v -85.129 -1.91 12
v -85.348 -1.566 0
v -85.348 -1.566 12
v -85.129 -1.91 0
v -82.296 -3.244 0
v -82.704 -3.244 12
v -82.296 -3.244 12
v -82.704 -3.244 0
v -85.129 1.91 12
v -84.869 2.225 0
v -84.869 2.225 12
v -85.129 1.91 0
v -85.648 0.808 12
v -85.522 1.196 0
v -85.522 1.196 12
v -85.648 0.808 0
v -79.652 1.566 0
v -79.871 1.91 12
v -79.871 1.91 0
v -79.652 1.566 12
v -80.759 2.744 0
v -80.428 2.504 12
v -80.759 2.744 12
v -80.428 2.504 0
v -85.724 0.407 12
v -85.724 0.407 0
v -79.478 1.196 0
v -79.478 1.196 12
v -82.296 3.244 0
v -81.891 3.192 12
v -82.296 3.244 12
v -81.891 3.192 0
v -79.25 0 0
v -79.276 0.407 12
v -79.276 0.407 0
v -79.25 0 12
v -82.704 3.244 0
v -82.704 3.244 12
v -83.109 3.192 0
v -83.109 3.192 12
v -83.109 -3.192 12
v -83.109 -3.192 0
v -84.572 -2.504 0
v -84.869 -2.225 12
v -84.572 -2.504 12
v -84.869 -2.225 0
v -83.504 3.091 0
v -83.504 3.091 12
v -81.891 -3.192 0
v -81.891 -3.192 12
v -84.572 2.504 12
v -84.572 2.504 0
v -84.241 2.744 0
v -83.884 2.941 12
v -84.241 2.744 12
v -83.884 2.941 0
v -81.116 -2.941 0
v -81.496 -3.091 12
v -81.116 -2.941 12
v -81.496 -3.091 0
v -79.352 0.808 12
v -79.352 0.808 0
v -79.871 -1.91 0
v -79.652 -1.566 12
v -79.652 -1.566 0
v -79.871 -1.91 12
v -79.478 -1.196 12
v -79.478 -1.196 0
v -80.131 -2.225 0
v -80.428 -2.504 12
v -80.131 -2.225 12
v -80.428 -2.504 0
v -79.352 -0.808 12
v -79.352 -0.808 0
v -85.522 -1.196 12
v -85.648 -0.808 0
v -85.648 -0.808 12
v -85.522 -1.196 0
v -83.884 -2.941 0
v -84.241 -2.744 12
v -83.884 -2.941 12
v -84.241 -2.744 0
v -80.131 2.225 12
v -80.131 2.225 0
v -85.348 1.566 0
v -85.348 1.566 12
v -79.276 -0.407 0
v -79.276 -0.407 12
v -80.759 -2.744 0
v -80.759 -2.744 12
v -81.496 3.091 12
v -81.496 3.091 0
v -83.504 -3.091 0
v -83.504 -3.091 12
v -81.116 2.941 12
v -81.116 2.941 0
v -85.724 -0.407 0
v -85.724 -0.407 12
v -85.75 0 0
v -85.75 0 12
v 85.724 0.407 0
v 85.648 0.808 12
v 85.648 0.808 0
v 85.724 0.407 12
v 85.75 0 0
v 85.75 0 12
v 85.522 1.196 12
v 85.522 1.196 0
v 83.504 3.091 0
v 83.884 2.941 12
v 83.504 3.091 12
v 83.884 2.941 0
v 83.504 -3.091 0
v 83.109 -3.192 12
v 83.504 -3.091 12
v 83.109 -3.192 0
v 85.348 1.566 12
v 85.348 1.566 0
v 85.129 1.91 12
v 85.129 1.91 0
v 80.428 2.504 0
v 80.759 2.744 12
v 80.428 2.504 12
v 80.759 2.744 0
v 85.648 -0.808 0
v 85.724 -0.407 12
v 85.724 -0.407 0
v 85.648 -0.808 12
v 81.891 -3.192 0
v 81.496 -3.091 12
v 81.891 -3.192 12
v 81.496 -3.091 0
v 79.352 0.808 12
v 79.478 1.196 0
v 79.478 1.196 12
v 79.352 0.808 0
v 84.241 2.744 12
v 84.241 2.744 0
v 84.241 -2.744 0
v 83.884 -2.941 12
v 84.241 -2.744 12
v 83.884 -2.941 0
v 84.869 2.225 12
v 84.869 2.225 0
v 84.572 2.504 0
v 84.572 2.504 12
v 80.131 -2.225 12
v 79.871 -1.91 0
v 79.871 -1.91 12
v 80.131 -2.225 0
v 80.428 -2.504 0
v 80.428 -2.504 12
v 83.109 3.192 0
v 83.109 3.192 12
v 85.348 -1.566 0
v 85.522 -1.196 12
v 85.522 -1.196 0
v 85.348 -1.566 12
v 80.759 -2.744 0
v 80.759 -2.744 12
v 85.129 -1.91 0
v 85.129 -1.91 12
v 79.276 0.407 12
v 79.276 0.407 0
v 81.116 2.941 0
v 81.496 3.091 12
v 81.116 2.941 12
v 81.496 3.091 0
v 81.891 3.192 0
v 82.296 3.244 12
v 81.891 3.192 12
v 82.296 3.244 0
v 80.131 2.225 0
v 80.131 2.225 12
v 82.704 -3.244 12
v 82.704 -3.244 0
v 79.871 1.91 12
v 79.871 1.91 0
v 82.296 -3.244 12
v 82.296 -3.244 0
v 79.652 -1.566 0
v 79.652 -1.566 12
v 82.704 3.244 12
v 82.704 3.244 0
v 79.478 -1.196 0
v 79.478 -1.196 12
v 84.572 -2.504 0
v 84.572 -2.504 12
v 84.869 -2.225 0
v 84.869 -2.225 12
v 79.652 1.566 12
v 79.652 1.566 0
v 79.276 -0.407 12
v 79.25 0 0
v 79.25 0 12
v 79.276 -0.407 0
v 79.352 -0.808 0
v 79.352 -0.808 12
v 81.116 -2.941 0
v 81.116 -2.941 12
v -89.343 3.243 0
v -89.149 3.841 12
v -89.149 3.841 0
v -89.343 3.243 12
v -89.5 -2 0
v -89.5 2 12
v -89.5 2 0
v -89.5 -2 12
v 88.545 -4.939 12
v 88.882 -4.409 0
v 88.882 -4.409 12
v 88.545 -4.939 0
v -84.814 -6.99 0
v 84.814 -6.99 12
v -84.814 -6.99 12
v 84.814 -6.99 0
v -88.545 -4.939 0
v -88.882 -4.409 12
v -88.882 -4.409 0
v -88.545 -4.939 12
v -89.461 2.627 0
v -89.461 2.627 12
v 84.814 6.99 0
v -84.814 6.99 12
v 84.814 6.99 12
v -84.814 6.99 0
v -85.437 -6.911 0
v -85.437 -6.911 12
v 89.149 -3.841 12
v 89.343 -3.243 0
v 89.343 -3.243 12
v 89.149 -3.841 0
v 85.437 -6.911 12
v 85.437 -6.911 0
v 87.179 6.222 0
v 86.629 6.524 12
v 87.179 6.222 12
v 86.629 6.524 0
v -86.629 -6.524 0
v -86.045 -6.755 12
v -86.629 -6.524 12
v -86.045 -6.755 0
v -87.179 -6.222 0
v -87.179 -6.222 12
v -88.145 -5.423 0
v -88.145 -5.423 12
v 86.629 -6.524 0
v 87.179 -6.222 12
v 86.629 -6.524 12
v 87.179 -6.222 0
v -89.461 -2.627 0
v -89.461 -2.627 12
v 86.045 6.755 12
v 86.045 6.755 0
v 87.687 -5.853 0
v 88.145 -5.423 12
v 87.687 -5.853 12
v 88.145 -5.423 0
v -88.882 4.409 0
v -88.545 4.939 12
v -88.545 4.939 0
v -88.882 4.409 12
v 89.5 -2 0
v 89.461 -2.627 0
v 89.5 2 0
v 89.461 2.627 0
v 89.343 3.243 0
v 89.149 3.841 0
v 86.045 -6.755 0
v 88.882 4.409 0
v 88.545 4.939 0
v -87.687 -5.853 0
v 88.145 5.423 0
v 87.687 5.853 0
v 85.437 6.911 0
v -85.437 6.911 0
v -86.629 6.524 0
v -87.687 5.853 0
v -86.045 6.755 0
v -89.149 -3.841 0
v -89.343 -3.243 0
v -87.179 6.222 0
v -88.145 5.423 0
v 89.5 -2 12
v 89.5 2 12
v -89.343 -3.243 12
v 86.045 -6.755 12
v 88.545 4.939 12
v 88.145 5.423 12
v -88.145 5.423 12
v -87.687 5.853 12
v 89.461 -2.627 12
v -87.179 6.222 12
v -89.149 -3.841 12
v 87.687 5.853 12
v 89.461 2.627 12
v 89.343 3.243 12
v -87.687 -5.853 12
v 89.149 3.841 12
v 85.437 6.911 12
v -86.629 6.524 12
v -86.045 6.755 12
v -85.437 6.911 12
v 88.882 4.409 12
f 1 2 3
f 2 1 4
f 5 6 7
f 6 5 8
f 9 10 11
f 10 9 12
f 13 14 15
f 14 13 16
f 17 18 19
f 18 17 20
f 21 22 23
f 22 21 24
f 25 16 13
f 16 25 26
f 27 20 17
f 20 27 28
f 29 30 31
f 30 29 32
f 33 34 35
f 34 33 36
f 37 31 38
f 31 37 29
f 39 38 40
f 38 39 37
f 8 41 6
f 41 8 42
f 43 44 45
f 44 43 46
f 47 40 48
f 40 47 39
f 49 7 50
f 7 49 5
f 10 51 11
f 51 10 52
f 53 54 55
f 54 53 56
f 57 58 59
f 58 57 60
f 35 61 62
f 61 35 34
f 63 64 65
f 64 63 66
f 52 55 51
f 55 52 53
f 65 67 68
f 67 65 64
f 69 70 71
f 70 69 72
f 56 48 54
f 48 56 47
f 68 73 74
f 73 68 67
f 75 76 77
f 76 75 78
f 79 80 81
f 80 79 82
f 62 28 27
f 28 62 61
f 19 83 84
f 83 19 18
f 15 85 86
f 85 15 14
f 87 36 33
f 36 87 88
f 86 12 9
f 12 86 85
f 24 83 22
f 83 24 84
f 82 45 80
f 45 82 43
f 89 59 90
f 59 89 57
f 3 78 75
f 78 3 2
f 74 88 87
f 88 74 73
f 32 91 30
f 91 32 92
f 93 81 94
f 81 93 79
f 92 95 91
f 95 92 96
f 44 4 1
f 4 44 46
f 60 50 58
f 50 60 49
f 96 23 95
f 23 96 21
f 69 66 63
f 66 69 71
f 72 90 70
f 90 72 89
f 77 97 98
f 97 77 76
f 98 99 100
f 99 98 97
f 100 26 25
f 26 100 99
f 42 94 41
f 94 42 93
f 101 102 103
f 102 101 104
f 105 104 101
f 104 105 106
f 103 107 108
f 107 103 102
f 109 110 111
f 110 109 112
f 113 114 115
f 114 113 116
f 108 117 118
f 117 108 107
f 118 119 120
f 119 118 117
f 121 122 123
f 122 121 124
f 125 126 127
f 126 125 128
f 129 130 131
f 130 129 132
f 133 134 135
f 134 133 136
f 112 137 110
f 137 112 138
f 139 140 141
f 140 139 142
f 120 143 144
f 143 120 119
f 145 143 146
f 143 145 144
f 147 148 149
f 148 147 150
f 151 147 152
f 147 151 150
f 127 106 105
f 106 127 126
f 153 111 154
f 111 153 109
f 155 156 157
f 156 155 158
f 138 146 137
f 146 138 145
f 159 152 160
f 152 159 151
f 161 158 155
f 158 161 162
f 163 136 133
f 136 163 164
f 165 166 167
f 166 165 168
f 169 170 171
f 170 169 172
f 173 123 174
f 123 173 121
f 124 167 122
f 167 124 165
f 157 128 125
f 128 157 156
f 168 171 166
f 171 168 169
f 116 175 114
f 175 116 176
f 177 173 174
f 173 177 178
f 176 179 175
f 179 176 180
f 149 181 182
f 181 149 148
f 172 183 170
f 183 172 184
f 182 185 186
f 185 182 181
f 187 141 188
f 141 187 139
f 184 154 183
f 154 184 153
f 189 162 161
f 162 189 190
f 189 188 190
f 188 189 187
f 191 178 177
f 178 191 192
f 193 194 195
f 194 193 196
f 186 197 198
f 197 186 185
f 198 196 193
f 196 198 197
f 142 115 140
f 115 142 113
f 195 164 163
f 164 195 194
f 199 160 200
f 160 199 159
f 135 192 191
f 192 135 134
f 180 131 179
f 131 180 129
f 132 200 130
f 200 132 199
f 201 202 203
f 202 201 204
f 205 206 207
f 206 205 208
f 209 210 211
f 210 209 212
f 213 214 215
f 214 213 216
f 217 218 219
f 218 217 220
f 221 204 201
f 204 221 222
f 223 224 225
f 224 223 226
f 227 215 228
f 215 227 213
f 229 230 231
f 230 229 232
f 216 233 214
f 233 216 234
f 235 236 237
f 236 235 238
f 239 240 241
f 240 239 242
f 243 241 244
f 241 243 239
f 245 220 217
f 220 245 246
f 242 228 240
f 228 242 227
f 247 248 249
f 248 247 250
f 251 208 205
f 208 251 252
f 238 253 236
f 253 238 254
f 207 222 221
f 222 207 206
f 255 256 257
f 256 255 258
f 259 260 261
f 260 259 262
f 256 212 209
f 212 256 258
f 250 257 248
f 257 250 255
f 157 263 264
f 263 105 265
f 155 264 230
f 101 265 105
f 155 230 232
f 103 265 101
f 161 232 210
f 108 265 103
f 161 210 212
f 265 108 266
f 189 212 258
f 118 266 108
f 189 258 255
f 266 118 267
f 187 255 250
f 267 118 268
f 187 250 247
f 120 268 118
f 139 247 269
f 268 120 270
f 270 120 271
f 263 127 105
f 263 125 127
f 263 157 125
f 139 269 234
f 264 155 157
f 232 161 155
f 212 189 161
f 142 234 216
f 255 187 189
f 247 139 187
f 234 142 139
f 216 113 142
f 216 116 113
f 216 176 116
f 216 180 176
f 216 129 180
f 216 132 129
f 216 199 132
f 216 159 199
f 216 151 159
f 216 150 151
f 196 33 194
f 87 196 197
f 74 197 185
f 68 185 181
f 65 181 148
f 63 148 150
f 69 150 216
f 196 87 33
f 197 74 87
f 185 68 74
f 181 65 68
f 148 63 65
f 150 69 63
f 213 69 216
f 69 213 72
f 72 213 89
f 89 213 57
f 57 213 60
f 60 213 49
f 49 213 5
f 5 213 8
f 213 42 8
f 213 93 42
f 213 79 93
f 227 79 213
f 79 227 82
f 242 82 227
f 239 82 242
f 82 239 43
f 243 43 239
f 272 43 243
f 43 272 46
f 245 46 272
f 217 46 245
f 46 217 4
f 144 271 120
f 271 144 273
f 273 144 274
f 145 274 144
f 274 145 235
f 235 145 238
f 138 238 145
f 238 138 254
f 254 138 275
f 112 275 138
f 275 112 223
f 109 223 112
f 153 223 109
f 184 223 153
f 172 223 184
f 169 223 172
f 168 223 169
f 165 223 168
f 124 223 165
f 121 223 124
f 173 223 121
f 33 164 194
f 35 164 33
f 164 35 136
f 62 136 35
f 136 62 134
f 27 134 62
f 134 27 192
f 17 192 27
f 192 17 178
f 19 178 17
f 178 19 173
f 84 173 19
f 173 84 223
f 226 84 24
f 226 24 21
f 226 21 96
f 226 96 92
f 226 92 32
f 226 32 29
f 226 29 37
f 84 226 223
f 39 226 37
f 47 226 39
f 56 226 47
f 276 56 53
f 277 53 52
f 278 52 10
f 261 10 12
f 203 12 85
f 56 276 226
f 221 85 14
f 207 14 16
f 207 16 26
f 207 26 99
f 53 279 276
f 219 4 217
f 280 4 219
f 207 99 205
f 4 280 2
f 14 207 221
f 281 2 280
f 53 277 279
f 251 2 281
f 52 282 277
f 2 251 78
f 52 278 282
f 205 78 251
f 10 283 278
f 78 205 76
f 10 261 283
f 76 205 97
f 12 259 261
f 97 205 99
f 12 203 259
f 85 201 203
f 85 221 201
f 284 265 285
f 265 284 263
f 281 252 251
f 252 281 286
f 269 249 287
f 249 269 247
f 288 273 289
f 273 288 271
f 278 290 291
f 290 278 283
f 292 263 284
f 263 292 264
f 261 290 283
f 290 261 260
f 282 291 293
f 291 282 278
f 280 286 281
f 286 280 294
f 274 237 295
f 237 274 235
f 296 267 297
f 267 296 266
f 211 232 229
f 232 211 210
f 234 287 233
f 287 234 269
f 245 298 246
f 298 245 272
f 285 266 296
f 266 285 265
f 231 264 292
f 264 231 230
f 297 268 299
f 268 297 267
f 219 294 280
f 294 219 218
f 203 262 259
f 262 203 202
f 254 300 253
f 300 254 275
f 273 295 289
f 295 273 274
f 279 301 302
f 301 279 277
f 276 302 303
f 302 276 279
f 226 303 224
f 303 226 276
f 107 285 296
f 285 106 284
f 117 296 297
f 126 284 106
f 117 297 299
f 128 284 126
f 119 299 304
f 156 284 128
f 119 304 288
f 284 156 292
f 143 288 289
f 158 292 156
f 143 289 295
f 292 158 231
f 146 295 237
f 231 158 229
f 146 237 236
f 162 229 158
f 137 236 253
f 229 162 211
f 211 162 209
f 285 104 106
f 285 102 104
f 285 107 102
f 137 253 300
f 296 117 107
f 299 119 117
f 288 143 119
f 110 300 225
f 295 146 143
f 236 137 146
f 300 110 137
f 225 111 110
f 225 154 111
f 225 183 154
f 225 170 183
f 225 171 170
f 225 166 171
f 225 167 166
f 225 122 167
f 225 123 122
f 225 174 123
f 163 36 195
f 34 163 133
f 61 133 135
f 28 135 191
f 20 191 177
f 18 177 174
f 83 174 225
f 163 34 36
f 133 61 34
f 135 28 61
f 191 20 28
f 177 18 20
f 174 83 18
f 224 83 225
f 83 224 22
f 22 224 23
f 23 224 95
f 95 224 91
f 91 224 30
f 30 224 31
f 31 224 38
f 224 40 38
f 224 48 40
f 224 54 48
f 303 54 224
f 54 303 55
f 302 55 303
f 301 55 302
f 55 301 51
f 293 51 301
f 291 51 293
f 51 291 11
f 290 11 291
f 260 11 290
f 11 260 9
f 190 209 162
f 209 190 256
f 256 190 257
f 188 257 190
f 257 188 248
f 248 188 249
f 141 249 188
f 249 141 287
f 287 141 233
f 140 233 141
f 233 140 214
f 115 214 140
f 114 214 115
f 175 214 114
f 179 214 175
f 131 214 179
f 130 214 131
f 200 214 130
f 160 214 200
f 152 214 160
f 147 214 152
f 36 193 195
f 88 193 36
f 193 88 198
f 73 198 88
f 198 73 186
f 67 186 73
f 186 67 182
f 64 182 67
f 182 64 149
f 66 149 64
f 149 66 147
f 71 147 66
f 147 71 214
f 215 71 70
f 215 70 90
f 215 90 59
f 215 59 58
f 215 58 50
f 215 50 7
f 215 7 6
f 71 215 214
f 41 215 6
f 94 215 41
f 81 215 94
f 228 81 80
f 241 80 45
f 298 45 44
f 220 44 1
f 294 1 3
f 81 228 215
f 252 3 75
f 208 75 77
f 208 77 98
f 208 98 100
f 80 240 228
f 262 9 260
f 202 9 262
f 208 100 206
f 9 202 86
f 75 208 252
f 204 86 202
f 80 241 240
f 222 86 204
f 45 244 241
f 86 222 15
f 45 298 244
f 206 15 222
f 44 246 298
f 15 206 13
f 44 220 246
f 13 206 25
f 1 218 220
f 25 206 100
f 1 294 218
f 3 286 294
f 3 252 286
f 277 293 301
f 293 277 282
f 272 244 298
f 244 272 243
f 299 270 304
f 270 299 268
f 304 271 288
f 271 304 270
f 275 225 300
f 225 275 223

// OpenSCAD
$fn = 50;


difference() {
	union() {
		hull() {
			translate(v = [-84.5000000000, 2.0000000000, 0]) {
				cylinder(h = 12, r = 5);
			}
			translate(v = [84.5000000000, 2.0000000000, 0]) {
				cylinder(h = 12, r = 5);
			}
			translate(v = [-84.5000000000, -2.0000000000, 0]) {
				cylinder(h = 12, r = 5);
			}
			translate(v = [84.5000000000, -2.0000000000, 0]) {
				cylinder(h = 12, r = 5);
			}
		}
	}
	union() {
		translate(v = [-82.5000000000, 0.0000000000, -100.0000000000]) {
			cylinder(h = 200, r = 3.2500000000);
		}
		translate(v = [-82.5000000000, 0.0000000000, -100.0000000000]) {
			cylinder(h = 200, r = 3.2500000000);
		}
		translate(v = [82.5000000000, 0.0000000000, -100.0000000000]) {
			cylinder(h = 200, r = 3.2500000000);
		}
		translate(v = [82.5000000000, 0.0000000000, -100.0000000000]) {
			cylinder(h = 200, r = 3.2500000000);
		}
	}
}
